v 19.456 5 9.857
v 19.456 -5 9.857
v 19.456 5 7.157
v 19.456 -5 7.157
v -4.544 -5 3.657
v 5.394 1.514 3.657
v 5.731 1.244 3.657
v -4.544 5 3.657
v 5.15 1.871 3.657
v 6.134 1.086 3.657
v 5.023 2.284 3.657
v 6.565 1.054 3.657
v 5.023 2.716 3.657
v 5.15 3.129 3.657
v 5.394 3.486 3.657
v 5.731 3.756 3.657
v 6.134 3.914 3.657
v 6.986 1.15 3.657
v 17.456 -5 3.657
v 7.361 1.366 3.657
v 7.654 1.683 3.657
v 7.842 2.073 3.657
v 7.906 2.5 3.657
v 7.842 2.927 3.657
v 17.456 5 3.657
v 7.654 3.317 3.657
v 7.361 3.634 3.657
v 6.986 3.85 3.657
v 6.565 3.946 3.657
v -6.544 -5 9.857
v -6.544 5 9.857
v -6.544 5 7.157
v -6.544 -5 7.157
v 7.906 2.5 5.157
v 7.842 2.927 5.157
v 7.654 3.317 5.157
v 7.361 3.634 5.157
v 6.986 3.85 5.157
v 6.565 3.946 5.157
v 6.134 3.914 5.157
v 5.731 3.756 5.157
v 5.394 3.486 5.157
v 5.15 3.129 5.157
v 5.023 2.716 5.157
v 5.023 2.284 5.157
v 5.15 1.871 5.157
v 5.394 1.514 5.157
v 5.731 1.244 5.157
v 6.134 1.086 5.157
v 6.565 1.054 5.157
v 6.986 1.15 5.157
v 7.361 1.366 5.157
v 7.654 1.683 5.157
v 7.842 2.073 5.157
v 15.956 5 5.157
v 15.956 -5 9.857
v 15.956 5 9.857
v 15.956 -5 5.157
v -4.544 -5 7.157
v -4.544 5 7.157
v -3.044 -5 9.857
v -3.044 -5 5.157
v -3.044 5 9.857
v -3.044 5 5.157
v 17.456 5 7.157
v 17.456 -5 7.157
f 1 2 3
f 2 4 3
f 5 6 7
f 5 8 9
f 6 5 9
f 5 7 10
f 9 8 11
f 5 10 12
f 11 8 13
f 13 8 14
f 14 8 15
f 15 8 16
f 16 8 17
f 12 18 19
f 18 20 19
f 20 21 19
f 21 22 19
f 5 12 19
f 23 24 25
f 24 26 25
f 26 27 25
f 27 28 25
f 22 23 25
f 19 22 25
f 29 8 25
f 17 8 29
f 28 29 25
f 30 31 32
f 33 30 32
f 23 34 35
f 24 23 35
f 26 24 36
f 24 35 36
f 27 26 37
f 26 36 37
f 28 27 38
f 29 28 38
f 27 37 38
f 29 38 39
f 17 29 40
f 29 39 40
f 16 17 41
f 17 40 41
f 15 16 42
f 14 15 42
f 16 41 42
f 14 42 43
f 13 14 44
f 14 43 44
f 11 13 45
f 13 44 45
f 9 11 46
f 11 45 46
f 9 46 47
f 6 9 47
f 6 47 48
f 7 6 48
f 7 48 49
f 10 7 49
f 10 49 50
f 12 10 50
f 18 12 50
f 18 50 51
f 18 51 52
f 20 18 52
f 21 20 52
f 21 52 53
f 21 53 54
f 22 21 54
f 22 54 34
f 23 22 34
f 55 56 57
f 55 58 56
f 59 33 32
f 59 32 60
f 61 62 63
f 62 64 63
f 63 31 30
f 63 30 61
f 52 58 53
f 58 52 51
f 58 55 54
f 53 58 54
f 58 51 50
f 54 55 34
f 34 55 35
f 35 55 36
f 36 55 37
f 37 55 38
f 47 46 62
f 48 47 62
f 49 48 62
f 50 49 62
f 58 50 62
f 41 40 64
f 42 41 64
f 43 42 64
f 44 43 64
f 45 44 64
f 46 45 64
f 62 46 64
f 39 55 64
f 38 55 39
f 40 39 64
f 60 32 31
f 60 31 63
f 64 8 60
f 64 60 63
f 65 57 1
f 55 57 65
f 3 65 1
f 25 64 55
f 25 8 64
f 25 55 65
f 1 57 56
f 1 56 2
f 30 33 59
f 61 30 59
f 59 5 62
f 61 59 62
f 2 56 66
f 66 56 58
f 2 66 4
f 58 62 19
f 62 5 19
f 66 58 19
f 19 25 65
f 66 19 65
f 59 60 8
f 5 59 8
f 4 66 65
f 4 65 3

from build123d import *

# Parameters (mm, degrees)
SKETCH1_W           = 19
SKETCH1_H           = 1.5
SKETCH1_W_2         = 1.5
SKETCH1_H_2         = 4
BOSS_EXTRUDE1_DEPTH = 5
SKETCH2_W           = 3.5
SKETCH2_H           = 2
BOSS_EXTRUDE2_DEPTH = 5
SKETCH3_R           = 1.45
CUT_EXTRUDE1_DEPTH  = 5
BOSS_EXTRUDE3_DEPTH = 5
SKETCH5_W           = 3.5
SKETCH5_H           = 10
BOSS_EXTRUDE4_DEPTH = 0.7


with BuildPart() as part:
    # Sketch1 → Boss-Extrude1 (new body)
    with BuildSketch(Plane(origin=(0, 0, 0), x_dir=(1, 0, 0), z_dir=(0, 1, 0))):
        with Locations((6.456445993, -4.406794425)):
            Rectangle(SKETCH1_W, SKETCH1_H)
        with Locations((-3.793554007, -4.406794425)):
            Rectangle(SKETCH1_W_2, SKETCH1_H)
        with Locations((-3.793554007, -7.156794425)):
            Rectangle(SKETCH1_W_2, SKETCH1_H_2)
        with Locations((16.706445993, -4.406794425)):
            Rectangle(SKETCH1_W_2, SKETCH1_H)
        with Locations((16.706445993, -7.156794425)):
            Rectangle(SKETCH1_W_2, SKETCH1_H_2)
    extrude(amount=BOSS_EXTRUDE1_DEPTH)

    # Sketch2 → Boss-Extrude2 (add)
    with BuildSketch(Plane(origin=(0, 5, 0), x_dir=(1, 0, 0), z_dir=(0, 1, 0))):
        with Locations((-4.793554007, -8.156794425)):
            Rectangle(SKETCH2_W, SKETCH2_H)
        with Locations((17.706445993, -8.156794425)):
            Rectangle(SKETCH2_W, SKETCH2_H)
    extrude(amount=-BOSS_EXTRUDE2_DEPTH)

    # Sketch3 → Cut-Extrude1 (cut)
    with BuildSketch(Plane.XY.offset(5.156794425)):
        with Locations((6.456445993, 2.5)):
            Circle(SKETCH3_R)
    extrude(amount=-CUT_EXTRUDE1_DEPTH, mode=Mode.SUBTRACT)

    # Sketch4 → Boss-Extrude3 (add)
    with BuildSketch(Plane.XZ):
        Polygon((17.456445993, 3.656794425), (17.456445993, 7.156794425), (19.456445993, 7.156794425), (19.456445993, 9.156794425), (15.956445993, 9.156794425), (15.956445993, 5.156794425), (-3.043554007, 5.156794425), (-3.043554007, 9.156794425), (-6.543554007, 9.156794425), (-6.543554007, 7.156794425), (-4.543554007, 7.156794425), (-4.543554007, 3.656794425), align=None)
    extrude(amount=BOSS_EXTRUDE3_DEPTH)

    # Sketch5 → Boss-Extrude4 (add)
    with BuildSketch(Plane.XY.offset(9.156794425)):
        with Locations((17.706445993, 0)):
            Rectangle(SKETCH5_W, SKETCH5_H)
        with Locations((-4.793554007, 0)):
            Rectangle(SKETCH5_W, SKETCH5_H)
    extrude(amount=BOSS_EXTRUDE4_DEPTH)


solid = part.part
